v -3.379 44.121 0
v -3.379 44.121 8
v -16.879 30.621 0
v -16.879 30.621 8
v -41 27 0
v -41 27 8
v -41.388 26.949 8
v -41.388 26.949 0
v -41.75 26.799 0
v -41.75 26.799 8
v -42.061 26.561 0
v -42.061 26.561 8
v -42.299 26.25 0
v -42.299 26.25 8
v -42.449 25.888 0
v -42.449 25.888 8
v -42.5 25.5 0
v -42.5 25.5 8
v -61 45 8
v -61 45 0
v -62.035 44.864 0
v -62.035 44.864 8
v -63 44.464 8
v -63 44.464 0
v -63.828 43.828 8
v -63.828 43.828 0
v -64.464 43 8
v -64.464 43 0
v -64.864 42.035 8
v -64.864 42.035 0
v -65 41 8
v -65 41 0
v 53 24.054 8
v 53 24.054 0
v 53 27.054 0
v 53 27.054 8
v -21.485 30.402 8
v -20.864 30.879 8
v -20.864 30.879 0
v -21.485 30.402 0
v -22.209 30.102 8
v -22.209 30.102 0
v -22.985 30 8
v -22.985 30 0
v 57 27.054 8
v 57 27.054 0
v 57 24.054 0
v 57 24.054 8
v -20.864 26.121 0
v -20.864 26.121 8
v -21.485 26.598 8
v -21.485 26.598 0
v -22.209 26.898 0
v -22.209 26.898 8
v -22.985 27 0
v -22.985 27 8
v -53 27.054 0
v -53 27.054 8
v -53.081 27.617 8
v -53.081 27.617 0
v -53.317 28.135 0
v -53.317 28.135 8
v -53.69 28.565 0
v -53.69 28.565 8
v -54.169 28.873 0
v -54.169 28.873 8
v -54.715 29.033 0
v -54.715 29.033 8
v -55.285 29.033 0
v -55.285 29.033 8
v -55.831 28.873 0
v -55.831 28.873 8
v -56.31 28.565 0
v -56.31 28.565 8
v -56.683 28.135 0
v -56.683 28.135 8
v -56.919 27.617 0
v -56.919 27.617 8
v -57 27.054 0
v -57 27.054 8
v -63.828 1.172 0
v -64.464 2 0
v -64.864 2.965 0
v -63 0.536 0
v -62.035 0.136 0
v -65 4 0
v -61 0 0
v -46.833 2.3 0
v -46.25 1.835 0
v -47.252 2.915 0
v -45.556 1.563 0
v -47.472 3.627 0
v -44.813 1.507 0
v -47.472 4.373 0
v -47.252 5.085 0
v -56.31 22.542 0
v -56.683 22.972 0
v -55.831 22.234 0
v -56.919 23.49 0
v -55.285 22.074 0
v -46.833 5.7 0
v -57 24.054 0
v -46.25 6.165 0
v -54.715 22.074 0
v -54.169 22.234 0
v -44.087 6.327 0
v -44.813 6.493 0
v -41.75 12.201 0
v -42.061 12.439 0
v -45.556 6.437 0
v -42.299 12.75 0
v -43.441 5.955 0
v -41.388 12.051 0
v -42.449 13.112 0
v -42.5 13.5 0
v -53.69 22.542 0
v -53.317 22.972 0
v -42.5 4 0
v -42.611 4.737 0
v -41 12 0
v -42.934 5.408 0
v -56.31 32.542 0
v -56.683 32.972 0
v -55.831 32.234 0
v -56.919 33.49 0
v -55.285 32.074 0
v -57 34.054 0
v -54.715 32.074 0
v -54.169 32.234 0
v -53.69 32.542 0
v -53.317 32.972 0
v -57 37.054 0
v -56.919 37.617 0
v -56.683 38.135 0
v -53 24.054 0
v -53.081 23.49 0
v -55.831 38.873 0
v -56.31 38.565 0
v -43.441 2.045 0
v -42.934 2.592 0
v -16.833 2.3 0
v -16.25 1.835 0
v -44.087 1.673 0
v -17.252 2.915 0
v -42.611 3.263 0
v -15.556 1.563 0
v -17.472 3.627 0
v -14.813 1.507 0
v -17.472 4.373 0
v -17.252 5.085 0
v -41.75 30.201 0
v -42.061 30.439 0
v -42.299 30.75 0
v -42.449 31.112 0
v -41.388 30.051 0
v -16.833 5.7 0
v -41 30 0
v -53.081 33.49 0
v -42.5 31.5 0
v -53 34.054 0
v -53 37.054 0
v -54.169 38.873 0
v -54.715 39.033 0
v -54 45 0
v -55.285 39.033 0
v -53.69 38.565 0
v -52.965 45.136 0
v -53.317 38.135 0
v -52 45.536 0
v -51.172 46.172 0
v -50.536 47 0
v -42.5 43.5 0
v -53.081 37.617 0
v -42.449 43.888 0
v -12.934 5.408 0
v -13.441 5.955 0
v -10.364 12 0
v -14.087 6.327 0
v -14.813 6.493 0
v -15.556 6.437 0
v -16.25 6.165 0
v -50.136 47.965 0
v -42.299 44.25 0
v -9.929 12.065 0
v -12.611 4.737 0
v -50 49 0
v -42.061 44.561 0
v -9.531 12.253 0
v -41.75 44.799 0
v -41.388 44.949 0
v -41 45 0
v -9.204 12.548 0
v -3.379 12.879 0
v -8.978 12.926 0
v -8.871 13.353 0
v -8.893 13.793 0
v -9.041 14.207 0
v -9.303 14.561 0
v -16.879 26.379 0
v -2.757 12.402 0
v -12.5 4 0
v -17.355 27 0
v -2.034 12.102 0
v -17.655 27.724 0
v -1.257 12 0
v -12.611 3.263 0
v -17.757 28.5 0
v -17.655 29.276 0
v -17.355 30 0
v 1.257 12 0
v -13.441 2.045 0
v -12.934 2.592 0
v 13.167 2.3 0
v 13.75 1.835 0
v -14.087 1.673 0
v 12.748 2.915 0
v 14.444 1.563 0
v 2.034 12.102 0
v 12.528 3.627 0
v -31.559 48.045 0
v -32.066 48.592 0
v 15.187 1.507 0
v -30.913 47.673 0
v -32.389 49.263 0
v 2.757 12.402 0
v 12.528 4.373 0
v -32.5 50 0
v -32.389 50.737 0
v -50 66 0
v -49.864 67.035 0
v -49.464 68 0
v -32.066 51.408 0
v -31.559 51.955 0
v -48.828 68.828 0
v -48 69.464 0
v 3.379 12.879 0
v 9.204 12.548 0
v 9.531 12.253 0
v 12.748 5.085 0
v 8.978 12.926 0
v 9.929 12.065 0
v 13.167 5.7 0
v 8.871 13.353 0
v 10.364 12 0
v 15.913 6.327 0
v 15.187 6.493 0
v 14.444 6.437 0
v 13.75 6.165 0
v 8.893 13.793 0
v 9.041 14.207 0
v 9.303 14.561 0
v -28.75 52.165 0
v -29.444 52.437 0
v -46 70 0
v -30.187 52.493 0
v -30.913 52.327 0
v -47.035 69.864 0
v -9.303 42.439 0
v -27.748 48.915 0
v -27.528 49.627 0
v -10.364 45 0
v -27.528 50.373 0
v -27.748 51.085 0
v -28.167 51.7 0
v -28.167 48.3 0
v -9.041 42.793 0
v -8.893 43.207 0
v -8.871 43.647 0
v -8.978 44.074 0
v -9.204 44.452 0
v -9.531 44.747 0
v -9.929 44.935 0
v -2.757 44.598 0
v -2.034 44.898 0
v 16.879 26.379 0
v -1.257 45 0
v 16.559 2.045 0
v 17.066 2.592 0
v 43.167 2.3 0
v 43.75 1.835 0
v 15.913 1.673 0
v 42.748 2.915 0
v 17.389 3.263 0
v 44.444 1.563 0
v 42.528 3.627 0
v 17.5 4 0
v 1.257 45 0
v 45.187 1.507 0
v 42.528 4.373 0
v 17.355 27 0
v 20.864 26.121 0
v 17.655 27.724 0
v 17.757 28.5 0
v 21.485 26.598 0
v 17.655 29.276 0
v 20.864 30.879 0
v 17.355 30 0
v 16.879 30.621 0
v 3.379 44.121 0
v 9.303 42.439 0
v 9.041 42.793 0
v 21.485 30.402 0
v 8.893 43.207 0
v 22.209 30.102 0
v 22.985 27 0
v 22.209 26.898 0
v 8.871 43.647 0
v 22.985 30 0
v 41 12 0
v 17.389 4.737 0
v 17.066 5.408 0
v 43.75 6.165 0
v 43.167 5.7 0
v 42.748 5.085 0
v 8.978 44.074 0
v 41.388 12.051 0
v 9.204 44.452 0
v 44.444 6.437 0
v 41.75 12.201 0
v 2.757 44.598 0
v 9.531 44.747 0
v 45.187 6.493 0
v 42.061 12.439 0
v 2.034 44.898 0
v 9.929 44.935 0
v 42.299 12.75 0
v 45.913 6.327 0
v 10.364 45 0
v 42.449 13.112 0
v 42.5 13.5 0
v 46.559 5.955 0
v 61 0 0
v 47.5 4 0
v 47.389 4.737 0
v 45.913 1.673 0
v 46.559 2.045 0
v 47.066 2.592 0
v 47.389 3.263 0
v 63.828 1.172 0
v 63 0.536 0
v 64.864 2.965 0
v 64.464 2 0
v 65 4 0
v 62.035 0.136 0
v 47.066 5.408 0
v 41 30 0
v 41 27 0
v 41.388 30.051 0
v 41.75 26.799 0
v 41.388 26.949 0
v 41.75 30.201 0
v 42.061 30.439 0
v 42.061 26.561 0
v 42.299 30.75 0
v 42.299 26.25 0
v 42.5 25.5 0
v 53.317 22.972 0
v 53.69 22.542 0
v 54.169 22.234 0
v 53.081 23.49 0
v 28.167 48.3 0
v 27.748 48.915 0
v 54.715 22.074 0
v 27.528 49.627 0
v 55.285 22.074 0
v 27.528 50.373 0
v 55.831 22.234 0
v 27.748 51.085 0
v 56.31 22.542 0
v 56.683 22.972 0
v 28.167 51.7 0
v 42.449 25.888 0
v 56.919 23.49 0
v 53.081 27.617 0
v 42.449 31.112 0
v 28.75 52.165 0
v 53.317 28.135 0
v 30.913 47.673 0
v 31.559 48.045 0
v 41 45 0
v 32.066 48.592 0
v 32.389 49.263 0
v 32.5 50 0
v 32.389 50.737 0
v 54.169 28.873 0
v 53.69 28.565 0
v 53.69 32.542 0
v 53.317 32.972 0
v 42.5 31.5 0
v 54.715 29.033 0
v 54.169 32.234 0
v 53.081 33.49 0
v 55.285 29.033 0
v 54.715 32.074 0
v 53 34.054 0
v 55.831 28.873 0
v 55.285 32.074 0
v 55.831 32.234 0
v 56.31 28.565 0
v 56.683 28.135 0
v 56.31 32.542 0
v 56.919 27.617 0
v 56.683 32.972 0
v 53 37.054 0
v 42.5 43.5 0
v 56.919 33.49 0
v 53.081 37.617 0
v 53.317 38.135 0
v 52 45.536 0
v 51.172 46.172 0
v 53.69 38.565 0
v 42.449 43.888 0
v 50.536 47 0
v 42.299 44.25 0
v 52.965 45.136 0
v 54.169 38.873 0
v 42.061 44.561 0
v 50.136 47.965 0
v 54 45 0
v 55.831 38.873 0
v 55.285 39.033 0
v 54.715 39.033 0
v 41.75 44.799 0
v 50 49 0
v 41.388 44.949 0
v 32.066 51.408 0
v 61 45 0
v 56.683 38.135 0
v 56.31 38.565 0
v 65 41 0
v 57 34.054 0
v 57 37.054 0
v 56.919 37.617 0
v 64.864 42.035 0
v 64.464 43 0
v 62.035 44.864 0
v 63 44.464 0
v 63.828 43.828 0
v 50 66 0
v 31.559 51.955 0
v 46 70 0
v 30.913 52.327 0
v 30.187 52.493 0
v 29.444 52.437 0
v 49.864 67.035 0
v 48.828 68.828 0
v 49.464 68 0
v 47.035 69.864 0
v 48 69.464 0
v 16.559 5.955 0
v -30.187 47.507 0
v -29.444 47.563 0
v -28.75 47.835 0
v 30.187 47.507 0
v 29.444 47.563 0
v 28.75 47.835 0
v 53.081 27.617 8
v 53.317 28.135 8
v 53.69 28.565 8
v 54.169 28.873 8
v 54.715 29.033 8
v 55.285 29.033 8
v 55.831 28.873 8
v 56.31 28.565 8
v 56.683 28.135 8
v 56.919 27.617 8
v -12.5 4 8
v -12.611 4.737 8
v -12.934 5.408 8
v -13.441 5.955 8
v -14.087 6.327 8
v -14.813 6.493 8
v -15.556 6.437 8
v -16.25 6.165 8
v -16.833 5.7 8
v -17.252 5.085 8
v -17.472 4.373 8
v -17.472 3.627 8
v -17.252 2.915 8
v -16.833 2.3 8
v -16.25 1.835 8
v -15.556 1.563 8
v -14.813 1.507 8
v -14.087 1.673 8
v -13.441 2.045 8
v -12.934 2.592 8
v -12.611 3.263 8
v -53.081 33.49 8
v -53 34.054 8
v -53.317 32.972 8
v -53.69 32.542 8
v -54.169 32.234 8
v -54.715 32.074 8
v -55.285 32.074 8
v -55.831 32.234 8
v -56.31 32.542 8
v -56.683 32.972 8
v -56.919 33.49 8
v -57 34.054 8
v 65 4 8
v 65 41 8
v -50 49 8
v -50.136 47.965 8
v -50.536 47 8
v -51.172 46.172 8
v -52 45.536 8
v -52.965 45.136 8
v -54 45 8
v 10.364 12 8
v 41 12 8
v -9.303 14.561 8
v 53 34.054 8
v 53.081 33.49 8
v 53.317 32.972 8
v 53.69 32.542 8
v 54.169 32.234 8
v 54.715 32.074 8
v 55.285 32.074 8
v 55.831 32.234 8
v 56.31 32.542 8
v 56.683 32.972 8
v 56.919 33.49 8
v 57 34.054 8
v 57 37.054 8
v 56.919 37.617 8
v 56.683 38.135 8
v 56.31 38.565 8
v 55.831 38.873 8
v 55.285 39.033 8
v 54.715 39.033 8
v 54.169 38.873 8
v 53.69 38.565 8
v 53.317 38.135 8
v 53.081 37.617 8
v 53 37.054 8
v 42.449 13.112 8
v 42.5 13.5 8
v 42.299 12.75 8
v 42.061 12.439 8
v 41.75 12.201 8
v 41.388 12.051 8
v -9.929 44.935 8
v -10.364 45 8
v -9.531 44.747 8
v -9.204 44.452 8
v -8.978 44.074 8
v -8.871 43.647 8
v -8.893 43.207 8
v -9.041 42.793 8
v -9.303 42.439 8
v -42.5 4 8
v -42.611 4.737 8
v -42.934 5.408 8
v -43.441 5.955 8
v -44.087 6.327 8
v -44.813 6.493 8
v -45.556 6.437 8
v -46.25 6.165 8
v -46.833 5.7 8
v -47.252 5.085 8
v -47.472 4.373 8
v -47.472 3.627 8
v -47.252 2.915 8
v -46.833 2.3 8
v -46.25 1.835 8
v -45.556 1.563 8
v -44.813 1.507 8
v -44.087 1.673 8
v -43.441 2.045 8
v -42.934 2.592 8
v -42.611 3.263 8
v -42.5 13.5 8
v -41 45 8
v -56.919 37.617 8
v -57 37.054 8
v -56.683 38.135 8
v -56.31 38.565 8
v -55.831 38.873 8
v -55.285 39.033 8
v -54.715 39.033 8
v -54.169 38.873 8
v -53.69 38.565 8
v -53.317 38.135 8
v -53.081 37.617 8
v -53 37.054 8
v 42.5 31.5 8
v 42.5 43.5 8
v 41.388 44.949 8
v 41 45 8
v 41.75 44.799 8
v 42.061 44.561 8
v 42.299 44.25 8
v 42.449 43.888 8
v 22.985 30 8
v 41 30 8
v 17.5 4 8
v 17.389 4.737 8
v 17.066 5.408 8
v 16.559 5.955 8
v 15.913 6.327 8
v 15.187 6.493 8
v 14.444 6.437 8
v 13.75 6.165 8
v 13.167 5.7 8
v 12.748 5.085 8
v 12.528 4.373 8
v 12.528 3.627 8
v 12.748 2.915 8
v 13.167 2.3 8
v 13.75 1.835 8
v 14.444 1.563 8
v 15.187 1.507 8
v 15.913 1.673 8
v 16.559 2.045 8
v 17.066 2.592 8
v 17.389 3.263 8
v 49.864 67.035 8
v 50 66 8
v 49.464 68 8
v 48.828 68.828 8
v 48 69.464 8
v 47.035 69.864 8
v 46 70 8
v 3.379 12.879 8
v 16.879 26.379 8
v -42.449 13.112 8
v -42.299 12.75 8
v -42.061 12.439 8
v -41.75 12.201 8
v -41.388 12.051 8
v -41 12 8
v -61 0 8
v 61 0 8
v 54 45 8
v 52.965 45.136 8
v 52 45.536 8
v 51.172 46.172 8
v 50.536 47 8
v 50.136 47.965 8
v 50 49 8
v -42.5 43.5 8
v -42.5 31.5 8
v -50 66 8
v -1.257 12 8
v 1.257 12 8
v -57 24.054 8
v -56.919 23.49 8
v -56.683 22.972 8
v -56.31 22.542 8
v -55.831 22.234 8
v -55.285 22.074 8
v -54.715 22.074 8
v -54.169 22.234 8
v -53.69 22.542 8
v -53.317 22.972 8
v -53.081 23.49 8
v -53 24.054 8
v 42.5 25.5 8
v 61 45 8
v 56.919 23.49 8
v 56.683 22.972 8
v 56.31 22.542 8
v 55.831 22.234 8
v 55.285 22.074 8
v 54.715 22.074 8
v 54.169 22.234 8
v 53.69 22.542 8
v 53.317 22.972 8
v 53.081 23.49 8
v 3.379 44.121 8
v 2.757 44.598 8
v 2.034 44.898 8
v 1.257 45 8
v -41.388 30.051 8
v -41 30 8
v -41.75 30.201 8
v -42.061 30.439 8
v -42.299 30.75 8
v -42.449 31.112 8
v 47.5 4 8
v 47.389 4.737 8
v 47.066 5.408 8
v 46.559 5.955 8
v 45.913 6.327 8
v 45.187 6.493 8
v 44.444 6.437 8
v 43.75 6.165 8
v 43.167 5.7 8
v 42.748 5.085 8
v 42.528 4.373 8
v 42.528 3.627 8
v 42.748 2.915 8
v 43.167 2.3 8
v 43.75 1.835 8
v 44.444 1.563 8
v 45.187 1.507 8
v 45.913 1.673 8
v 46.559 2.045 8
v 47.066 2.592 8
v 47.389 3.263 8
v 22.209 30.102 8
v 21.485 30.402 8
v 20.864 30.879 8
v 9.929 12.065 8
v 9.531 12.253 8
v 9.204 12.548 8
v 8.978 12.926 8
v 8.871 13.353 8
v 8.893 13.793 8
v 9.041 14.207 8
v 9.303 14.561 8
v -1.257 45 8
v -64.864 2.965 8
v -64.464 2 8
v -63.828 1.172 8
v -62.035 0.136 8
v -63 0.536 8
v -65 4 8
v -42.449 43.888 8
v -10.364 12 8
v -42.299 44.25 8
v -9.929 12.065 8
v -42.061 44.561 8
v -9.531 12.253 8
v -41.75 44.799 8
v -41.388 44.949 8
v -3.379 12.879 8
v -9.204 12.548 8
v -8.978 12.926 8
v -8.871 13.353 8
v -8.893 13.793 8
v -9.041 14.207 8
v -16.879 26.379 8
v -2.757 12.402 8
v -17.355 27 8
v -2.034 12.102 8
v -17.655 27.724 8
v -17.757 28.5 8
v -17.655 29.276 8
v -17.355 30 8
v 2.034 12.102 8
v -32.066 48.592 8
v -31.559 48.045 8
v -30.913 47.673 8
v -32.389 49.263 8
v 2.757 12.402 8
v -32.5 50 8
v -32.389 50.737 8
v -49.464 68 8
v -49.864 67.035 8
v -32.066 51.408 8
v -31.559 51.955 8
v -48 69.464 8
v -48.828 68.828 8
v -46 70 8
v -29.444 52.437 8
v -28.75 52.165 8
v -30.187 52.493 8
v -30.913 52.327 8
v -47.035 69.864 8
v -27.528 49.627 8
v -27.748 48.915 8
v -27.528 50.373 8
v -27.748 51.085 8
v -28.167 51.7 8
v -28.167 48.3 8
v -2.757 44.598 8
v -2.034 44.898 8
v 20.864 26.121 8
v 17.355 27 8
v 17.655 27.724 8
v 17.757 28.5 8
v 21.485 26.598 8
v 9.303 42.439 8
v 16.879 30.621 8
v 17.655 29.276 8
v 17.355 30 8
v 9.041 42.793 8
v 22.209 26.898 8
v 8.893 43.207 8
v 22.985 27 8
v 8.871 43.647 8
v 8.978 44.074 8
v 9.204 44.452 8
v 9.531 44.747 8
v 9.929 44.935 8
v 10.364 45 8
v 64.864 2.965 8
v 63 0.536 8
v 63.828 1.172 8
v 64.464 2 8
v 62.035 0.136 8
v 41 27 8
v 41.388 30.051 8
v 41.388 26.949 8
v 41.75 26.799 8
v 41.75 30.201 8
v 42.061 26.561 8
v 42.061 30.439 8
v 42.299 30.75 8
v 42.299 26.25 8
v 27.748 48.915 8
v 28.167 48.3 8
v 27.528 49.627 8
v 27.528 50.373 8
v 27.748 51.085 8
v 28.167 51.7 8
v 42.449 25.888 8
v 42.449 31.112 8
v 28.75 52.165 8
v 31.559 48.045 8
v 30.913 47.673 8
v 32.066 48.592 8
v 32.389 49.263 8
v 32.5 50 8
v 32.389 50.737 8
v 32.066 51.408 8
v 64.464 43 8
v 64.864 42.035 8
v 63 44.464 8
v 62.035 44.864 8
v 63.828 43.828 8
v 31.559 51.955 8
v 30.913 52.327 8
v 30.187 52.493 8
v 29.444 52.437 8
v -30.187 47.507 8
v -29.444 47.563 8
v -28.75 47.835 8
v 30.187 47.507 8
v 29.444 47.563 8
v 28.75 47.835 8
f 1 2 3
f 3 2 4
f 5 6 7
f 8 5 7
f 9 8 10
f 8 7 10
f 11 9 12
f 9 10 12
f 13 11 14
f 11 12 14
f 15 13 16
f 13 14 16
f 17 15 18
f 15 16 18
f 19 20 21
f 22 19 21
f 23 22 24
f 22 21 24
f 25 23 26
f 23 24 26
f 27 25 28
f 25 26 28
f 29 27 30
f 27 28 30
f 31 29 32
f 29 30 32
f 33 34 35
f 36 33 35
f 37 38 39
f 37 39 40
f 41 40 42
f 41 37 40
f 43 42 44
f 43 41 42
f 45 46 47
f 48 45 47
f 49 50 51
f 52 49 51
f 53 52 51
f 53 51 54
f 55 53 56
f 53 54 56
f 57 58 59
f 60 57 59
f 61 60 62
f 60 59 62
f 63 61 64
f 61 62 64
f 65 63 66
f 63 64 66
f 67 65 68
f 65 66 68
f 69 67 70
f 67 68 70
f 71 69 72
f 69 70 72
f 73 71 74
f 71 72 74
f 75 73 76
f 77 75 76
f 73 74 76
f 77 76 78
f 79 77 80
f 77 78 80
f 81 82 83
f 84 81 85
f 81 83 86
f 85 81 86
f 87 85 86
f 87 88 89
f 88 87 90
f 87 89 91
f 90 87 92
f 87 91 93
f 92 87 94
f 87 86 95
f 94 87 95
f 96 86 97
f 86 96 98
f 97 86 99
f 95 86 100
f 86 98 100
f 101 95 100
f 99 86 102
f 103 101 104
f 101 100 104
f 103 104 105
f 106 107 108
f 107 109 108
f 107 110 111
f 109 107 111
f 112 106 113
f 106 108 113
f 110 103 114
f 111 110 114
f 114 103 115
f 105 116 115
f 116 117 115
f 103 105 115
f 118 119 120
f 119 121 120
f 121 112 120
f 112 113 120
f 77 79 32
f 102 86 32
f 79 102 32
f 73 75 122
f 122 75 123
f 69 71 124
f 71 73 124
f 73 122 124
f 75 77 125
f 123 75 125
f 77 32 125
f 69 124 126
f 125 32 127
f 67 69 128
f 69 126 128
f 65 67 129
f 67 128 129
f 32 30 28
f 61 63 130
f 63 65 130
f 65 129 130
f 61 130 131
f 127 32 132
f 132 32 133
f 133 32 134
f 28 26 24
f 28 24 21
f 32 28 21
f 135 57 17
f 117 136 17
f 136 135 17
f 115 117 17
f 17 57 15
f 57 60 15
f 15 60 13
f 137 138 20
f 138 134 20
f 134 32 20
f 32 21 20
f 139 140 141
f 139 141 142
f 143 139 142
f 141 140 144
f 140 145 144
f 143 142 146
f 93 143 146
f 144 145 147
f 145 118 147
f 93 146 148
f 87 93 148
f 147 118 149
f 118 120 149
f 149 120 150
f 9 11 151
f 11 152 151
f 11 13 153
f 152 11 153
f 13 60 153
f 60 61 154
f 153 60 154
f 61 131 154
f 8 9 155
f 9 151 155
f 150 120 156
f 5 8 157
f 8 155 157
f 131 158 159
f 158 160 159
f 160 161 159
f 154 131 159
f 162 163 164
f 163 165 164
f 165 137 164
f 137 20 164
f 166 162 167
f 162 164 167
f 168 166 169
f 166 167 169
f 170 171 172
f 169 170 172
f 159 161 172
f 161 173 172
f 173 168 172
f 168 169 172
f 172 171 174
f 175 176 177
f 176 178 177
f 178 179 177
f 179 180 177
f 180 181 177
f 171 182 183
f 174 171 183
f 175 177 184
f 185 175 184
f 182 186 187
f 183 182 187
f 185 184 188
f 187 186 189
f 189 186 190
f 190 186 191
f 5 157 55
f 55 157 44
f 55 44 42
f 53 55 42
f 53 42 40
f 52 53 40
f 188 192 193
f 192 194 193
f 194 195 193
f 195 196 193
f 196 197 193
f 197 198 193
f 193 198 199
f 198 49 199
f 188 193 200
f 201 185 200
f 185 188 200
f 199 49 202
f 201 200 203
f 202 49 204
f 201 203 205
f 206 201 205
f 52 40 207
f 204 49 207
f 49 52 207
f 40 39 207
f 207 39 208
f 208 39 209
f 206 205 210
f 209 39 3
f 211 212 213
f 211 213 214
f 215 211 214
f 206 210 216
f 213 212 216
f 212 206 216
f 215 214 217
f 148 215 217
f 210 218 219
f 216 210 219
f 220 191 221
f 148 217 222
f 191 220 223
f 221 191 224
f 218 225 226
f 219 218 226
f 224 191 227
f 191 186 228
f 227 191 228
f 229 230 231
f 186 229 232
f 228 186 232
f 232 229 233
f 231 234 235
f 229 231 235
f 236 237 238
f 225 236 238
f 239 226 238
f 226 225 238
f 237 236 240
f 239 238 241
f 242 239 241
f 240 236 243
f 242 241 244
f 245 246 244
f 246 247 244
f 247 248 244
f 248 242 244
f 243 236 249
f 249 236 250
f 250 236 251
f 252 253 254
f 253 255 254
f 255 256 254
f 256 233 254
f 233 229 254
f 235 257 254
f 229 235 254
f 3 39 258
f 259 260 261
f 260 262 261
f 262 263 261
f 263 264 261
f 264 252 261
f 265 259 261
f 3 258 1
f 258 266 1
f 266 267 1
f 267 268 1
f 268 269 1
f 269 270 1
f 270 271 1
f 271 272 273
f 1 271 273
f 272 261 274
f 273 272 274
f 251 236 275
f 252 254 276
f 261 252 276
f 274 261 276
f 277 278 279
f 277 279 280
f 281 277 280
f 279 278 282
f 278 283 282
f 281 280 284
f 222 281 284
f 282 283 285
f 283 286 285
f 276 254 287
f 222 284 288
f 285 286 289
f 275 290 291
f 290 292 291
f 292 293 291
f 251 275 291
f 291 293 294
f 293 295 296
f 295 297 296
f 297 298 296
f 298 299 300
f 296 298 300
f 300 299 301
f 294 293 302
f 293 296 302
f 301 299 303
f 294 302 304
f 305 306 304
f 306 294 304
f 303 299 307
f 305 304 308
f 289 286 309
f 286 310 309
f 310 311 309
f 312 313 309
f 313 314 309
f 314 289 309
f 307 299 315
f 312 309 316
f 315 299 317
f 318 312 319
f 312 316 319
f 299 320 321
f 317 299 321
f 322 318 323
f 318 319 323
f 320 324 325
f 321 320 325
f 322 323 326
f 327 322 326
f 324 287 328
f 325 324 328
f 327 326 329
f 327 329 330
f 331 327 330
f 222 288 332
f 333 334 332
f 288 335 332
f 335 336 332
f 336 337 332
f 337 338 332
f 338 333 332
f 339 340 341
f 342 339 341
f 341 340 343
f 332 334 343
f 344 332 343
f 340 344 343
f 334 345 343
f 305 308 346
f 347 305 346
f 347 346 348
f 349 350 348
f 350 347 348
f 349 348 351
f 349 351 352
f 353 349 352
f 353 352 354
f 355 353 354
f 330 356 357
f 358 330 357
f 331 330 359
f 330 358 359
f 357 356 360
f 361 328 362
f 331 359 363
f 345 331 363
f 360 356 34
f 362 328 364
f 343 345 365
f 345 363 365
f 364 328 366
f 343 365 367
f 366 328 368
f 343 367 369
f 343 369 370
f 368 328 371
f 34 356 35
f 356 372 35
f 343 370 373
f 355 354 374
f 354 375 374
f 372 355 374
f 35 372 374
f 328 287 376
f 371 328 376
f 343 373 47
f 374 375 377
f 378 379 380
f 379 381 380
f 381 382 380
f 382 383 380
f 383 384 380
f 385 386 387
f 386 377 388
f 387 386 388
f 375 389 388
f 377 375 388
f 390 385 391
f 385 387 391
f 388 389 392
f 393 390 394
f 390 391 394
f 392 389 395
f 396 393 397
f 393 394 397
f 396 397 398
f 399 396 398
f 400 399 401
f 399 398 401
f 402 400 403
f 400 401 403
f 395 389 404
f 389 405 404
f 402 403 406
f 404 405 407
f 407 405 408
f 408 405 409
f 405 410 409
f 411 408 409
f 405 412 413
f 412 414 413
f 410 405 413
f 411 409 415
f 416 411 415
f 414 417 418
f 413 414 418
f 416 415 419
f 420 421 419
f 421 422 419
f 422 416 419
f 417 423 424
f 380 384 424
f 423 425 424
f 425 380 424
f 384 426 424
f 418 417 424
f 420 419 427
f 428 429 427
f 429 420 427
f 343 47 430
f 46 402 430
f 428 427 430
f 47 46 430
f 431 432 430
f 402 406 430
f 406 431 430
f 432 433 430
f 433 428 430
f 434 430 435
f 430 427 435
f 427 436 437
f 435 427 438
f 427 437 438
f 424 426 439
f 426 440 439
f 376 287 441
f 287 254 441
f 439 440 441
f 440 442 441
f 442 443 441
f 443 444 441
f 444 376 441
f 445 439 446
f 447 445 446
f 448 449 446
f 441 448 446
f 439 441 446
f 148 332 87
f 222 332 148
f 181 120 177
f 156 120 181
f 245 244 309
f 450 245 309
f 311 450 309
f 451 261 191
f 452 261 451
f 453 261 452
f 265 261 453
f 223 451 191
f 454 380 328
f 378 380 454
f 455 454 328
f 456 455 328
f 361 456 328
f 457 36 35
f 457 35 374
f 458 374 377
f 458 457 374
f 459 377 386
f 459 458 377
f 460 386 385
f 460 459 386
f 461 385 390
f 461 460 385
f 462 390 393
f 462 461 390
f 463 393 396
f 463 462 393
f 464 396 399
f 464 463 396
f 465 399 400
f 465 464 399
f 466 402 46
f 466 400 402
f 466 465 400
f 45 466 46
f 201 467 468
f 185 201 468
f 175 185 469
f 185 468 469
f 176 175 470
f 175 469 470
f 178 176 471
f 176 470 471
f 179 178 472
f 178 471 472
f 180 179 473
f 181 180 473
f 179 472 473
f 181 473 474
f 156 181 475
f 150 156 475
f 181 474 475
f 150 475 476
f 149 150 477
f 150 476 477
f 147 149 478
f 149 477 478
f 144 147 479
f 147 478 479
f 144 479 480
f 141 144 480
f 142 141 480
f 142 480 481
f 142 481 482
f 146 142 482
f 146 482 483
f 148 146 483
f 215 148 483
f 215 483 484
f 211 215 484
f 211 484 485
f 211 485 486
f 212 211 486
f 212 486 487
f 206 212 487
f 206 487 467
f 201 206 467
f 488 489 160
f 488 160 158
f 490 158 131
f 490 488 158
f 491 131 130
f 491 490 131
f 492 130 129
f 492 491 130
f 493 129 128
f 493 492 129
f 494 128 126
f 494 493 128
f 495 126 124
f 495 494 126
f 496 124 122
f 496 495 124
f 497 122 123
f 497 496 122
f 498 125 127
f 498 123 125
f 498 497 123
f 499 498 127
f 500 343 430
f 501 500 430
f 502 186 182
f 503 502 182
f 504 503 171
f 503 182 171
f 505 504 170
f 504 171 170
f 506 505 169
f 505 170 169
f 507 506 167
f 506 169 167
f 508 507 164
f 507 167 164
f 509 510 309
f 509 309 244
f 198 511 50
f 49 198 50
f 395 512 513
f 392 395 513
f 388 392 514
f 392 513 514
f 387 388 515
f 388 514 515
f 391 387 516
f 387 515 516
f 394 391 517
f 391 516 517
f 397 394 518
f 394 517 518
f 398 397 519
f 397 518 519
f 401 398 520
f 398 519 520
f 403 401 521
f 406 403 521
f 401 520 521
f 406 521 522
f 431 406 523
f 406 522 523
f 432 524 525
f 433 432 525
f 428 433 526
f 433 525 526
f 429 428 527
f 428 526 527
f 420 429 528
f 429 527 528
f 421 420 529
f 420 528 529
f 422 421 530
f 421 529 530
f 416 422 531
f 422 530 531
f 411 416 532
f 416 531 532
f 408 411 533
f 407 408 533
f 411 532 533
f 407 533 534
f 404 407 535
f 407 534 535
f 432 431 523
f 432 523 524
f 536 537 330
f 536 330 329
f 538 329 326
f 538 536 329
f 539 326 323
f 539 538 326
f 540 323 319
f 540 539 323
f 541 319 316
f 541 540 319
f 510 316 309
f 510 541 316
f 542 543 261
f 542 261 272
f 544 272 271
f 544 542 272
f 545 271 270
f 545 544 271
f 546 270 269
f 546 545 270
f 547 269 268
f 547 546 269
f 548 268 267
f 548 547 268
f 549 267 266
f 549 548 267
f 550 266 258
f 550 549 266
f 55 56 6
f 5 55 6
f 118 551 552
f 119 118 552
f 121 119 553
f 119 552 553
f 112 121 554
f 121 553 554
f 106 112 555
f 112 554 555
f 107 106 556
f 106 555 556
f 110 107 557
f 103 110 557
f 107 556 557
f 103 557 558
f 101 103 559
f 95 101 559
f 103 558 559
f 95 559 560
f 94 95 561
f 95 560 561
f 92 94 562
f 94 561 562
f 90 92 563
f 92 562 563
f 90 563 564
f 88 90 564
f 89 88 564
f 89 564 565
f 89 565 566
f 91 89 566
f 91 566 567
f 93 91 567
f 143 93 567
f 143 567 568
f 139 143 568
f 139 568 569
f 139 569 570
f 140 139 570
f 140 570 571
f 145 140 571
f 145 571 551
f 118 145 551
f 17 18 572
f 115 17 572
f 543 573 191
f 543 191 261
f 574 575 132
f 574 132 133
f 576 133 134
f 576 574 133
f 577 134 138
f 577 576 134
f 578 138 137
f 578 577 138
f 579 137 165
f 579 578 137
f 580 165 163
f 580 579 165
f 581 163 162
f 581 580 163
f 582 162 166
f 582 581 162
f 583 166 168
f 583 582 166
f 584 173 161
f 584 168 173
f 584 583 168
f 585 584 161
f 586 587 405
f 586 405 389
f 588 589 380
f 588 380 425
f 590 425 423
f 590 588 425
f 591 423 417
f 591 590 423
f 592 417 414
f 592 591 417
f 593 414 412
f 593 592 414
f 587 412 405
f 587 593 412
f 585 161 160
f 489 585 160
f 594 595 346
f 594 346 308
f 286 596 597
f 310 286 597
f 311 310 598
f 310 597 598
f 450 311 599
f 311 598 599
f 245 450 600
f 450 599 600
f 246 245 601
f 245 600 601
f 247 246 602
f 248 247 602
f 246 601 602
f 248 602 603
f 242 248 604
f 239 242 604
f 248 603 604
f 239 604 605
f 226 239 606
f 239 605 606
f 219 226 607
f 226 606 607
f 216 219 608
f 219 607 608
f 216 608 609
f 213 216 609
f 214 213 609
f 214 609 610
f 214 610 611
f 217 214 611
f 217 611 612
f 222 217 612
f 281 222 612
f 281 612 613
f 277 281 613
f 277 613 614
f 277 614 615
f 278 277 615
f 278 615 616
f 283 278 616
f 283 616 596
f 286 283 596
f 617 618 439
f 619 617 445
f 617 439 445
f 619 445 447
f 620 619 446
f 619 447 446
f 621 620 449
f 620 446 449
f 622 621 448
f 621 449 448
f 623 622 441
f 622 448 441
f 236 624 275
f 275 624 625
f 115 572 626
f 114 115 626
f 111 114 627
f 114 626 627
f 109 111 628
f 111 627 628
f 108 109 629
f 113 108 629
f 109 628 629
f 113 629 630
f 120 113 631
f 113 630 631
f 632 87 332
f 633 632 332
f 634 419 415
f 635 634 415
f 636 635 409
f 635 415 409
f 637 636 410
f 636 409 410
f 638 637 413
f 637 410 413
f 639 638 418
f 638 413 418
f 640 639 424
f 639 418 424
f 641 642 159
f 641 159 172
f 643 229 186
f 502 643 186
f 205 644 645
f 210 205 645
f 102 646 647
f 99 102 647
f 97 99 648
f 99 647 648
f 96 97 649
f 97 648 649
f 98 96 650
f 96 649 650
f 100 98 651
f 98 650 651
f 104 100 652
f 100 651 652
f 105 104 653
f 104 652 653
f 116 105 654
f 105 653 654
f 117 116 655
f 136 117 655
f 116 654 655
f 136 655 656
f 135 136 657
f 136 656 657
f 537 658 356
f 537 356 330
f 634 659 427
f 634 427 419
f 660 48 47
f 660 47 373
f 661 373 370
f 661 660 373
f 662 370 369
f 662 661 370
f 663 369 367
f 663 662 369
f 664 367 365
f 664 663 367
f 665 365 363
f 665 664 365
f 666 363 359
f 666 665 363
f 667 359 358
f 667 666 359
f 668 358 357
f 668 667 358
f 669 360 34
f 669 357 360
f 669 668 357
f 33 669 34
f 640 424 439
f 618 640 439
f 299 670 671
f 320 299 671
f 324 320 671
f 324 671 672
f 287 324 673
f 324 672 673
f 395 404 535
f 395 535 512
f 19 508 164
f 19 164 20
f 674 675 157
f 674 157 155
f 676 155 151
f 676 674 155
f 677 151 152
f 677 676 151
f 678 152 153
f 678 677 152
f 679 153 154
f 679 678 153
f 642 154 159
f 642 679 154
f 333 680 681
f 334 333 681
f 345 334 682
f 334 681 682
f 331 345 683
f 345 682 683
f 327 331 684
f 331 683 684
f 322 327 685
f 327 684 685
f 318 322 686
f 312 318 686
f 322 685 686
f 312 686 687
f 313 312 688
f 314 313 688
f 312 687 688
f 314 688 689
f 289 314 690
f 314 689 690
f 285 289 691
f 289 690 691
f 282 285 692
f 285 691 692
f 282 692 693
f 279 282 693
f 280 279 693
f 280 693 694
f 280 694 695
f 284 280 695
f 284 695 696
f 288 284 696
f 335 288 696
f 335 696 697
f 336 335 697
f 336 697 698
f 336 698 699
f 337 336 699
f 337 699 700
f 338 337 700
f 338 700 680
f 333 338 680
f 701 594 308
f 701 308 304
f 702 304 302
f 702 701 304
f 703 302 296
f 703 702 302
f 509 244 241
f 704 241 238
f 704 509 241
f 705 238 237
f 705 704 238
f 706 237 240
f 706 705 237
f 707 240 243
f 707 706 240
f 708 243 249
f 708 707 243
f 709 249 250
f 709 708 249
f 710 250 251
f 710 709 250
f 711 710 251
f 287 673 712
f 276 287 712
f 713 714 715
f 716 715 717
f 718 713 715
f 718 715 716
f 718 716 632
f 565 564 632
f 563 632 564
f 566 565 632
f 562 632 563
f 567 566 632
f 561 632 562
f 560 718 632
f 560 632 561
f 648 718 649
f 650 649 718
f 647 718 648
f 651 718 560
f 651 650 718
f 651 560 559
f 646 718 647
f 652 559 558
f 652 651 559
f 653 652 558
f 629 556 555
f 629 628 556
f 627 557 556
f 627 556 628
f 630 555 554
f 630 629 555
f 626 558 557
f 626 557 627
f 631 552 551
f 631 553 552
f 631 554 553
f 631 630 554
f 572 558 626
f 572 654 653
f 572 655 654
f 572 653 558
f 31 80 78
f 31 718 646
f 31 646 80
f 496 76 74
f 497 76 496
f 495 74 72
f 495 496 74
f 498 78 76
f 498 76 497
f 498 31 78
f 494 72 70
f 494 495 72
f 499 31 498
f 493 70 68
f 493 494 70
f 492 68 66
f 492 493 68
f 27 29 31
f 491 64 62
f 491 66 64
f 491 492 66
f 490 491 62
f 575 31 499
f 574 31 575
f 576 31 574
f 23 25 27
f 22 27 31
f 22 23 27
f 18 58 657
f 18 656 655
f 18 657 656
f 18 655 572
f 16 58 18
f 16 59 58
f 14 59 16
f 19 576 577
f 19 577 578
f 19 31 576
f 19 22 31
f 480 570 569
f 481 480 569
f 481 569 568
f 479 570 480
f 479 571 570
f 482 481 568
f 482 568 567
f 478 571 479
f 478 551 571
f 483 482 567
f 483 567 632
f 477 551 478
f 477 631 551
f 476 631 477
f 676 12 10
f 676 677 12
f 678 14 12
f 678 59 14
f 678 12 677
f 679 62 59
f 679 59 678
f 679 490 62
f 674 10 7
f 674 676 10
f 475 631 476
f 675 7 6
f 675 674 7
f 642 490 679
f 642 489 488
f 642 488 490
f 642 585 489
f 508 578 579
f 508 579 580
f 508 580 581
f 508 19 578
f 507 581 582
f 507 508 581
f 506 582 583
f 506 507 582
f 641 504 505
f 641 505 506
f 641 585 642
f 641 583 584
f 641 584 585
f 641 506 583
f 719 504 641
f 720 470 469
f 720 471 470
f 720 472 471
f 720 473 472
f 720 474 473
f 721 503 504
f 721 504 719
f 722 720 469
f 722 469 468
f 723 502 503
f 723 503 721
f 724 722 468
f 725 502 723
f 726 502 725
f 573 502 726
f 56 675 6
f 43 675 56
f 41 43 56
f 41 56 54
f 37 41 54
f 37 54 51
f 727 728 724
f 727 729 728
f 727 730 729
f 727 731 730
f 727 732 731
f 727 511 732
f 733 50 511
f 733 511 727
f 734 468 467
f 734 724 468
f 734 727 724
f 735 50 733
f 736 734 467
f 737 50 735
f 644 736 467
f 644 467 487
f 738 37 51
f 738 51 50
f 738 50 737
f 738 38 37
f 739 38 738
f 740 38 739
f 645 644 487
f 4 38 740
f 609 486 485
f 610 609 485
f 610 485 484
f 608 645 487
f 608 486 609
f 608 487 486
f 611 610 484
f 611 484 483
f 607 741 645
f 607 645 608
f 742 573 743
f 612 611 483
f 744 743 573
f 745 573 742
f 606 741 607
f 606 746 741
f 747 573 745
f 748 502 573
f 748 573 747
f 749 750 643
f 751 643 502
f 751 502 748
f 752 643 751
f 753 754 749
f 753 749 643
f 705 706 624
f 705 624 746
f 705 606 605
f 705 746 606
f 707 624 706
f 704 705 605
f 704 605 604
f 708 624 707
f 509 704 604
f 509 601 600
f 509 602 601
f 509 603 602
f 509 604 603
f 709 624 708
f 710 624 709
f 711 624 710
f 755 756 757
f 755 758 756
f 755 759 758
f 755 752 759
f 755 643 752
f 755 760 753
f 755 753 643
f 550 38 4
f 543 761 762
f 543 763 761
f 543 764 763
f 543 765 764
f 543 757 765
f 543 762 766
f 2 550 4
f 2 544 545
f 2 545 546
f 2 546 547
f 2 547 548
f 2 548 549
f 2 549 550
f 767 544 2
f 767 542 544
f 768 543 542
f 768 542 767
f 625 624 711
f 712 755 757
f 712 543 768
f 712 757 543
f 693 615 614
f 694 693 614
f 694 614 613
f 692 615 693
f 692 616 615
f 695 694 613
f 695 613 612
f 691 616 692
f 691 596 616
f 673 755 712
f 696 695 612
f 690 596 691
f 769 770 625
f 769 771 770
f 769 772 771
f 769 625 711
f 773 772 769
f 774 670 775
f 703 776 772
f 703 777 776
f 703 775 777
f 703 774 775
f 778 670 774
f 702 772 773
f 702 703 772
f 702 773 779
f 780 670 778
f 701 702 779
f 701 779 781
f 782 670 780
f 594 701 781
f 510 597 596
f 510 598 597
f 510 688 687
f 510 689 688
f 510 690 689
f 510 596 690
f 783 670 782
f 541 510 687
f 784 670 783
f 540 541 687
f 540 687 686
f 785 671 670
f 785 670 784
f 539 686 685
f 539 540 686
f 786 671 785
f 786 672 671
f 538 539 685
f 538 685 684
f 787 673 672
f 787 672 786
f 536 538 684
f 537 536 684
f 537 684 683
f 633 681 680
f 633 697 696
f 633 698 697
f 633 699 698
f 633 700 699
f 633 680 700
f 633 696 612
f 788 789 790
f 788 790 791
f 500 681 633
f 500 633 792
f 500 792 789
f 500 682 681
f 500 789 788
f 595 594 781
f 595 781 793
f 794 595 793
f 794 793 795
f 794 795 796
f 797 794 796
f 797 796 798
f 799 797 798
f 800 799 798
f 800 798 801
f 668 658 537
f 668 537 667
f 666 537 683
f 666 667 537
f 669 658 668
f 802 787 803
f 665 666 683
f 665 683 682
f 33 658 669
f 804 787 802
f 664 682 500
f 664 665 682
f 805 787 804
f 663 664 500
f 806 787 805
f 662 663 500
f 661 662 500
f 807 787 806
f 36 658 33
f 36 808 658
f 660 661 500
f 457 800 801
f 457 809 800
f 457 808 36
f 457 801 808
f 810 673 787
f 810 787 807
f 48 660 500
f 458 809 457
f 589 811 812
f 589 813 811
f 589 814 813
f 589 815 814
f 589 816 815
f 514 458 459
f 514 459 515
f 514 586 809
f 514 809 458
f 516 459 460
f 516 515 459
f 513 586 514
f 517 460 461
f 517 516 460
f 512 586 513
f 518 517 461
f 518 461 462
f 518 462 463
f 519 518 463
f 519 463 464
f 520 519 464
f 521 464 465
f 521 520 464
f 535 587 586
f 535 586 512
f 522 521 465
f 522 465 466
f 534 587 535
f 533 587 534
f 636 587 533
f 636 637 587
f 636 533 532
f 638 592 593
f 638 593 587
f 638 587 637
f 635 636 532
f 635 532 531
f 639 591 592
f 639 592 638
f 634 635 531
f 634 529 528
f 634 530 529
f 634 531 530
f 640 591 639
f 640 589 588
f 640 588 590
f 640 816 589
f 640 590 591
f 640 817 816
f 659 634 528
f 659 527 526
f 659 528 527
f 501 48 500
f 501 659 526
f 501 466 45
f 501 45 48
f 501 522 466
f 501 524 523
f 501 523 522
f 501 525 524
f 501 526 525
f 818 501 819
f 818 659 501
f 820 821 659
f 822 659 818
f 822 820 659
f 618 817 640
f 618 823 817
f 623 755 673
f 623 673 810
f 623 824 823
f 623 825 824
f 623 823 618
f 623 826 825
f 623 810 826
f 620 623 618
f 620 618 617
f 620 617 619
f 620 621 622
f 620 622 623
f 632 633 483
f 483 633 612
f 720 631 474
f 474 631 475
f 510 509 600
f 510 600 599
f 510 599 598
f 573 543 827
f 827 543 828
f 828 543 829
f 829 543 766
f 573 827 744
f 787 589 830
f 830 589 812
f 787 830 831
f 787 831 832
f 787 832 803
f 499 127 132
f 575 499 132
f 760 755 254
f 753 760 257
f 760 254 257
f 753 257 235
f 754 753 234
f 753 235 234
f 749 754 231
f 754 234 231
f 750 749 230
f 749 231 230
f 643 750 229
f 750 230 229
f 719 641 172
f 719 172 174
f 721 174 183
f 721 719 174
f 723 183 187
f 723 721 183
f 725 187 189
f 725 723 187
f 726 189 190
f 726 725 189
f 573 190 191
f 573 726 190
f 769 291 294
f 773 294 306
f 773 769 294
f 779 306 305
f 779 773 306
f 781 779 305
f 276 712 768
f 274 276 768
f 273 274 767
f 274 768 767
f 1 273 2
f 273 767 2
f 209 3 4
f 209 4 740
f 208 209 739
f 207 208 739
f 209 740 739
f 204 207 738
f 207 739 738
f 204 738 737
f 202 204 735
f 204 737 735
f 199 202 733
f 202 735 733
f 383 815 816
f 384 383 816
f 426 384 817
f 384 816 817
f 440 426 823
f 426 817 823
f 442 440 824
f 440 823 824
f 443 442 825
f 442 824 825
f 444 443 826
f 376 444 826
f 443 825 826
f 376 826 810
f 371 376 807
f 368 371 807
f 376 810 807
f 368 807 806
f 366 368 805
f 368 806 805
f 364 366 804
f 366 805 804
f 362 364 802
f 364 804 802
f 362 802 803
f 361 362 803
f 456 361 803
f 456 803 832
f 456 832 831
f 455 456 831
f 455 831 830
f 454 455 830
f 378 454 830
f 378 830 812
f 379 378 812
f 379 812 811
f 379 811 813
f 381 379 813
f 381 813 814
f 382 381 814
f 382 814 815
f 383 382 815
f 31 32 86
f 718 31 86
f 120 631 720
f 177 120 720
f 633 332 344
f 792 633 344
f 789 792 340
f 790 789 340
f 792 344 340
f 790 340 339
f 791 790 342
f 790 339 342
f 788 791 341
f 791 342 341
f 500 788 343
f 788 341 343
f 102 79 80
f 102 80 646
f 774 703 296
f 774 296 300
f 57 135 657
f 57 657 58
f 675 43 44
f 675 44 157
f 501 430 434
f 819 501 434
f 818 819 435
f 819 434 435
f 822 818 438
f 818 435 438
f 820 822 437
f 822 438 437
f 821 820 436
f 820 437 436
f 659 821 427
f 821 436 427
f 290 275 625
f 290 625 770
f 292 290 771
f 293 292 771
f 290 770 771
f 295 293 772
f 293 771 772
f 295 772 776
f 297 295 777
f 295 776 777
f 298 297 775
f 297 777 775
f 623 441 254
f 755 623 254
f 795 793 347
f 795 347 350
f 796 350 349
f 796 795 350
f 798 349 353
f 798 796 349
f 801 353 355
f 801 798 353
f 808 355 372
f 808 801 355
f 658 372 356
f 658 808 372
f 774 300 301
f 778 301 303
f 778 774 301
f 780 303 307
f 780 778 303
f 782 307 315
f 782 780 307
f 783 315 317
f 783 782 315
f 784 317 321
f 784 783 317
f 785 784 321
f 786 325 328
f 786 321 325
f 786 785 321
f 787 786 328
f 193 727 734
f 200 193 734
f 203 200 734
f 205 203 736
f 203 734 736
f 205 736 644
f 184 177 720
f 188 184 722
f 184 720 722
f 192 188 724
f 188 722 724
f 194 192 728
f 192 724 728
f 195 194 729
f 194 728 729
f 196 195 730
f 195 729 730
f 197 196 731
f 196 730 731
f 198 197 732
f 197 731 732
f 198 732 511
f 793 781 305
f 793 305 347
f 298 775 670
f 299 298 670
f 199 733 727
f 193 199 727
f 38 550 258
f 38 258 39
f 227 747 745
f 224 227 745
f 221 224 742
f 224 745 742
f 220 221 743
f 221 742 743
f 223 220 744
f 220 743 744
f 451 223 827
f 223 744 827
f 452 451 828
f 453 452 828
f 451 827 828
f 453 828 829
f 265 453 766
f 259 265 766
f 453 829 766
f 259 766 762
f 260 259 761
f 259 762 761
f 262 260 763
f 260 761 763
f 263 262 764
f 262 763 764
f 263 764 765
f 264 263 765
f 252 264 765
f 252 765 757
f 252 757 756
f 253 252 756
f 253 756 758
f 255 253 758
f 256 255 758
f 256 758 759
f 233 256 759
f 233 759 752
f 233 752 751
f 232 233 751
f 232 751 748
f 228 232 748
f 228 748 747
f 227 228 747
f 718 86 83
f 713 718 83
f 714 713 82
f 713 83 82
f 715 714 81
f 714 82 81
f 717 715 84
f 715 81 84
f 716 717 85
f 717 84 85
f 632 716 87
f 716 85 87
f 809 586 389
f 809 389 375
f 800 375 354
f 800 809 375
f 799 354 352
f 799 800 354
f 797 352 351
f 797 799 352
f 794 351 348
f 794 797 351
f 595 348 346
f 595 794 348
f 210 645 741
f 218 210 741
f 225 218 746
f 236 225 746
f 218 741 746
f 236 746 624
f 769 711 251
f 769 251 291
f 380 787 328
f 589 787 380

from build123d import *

# Parameters (mm, degrees)
BOSS_EXTRU_1_DEPTH      = 8
ESQUISSE2_R             = 2.5
ENL_V_MAT_EXTRU_1_DEPTH = 96.859271852
ENL_V_MAT_EXTRU_4_DEPTH = 96.859271852
ESQUISSE5_R             = 2.5
ENL_V_MAT_EXTRU_5_DEPTH = 96.859271852
ENL_V_MAT_EXTRU_6_DEPTH = 96.859271852


with BuildPart() as part:
    # Esquisse1 → Boss.-Extru.1 (new body)
    with BuildSketch(Plane.XY):
        with BuildLine():
            Line((65, 4), (65, 41))
            ThreePointArc((65, 41), (63.828427125, 43.828427125), (61, 45))
            Line((61, 45), (54, 45))
            ThreePointArc((54, 45), (51.171572875, 46.171572875), (50, 49))
            Line((50, 49), (50, 66))
            ThreePointArc((50, 66), (48.828427125, 68.828427125), (46, 70))
            Line((46, 70), (-46, 70))
            ThreePointArc((-46, 70), (-48.828427125, 68.828427125), (-50, 66))
            Line((-50, 66), (-50, 49))
            ThreePointArc((-50, 49), (-51.171572875, 46.171572875), (-54, 45))
            Line((-54, 45), (-61, 45))
            ThreePointArc((-61, 45), (-63.828427125, 43.828427125), (-65, 41))
            Line((-65, 41), (-65, 4))
            ThreePointArc((-65, 4), (-63.828427125, 1.171572875), (-61, 0))
            Line((-61, 0), (61, 0))
            ThreePointArc((61, 0), (63.828427125, 1.171572875), (65, 4))
        make_face()
    extrude(amount=BOSS_EXTRU_1_DEPTH)

    # Esquisse2 → Enlèv. mat.-Extru.1 (cut, through all)
    with BuildSketch(Plane.XY.offset(8)):
        with Locations((30, 50)):
            Circle(ESQUISSE2_R)
        with Locations(Location((-30, 50, 0), (0, 0, 180))):
            Circle(ESQUISSE2_R)
    extrude(amount=-ENL_V_MAT_EXTRU_1_DEPTH, mode=Mode.SUBTRACT)

    # Esquisse4 → Enlèv. mat.-Extru.4 (cut, through all)
    with BuildSketch(Plane.XY.offset(8)):
        with BuildLine():
            Line((-41, 45), (-10.363961031, 45))
            ThreePointArc((-10.363961031, 45), (-8.978141732, 44.074025149), (-9.303300859, 42.439339828))
            Line((-9.303300859, 42.439339828), (-20.863961031, 30.878679656))
            ThreePointArc((-20.863961031, 30.878679656), (-21.837231077, 30.228361402), (-22.985281374, 30))
            Line((-22.985281374, 30), (-41, 30))
            ThreePointArc((-41, 30), (-42.060660172, 30.439339828), (-42.5, 31.5))
            Line((-42.5, 31.5), (-42.5, 43.5))
            ThreePointArc((-42.5, 43.5), (-42.060660172, 44.560660172), (-41, 45))
        make_face()
        with BuildLine():
            Line((-41, 12), (-10.363961031, 12))
            ThreePointArc((-10.363961031, 12), (-8.978141732, 12.925974851), (-9.303300859, 14.560660172))
            Line((-9.303300859, 14.560660172), (-20.863961031, 26.121320344))
            ThreePointArc((-20.863961031, 26.121320344), (-21.837231077, 26.771638598), (-22.985281374, 27))
            Line((-22.985281374, 27), (-41, 27))
            ThreePointArc((-41, 27), (-42.060660172, 26.560660172), (-42.5, 25.5))
            Line((-42.5, 25.5), (-42.5, 13.5))
            ThreePointArc((-42.5, 13.5), (-42.060660172, 12.439339828), (-41, 12))
        make_face()
        with BuildLine():
            Line((42.5, 43.5), (42.5, 31.5))
            ThreePointArc((42.5, 31.5), (42.060660172, 30.439339828), (41, 30))
            Line((41, 30), (22.985281374, 30))
            ThreePointArc((22.985281374, 30), (21.837231077, 30.228361402), (20.863961031, 30.878679656))
            Line((20.863961031, 30.878679656), (9.303300859, 42.439339828))
            ThreePointArc((9.303300859, 42.439339828), (8.978141732, 44.074025149), (10.363961031, 45))
            Line((10.363961031, 45), (41, 45))
            ThreePointArc((41, 45), (42.060660172, 44.560660172), (42.5, 43.5))
        make_face()
        with BuildLine():
            Line((22.985281374, 27), (41, 27))
            ThreePointArc((41, 27), (42.060660172, 26.560660172), (42.5, 25.5))
            Line((42.5, 25.5), (42.5, 13.5))
            ThreePointArc((42.5, 13.5), (42.060660172, 12.439339828), (41, 12))
            Line((41, 12), (10.363961031, 12))
            ThreePointArc((10.363961031, 12), (8.978141732, 12.925974851), (9.303300859, 14.560660172))
            Line((9.303300859, 14.560660172), (20.863961031, 26.121320344))
            ThreePointArc((20.863961031, 26.121320344), (21.837231077, 26.771638598), (22.985281374, 27))
        make_face()
        with BuildLine():
            Line((-3.378679656, 44.121320344), (-16.878679656, 30.621320344))
            ThreePointArc((-16.878679656, 30.621320344), (-17.757359313, 28.5), (-16.878679656, 26.378679656))
            Line((-16.878679656, 26.378679656), (-3.378679656, 12.878679656))
            ThreePointArc((-3.378679656, 12.878679656), (-2.40540961, 12.228361402), (-1.257359313, 12))
            Line((-1.257359313, 12), (1.257359313, 12))
            ThreePointArc((1.257359313, 12), (2.40540961, 12.228361402), (3.378679656, 12.878679656))
            Line((3.378679656, 12.878679656), (16.878679656, 26.378679656))
            ThreePointArc((16.878679656, 26.378679656), (17.757359313, 28.5), (16.878679656, 30.621320344))
            Line((16.878679656, 30.621320344), (3.378679656, 44.121320344))
            ThreePointArc((3.378679656, 44.121320344), (2.40540961, 44.771638598), (1.257359313, 45))
            Line((1.257359313, 45), (-1.257359313, 45))
            ThreePointArc((-1.257359313, 45), (-2.40540961, 44.771638598), (-3.378679656, 44.121320344))
        make_face()
    extrude(amount=-ENL_V_MAT_EXTRU_4_DEPTH, mode=Mode.SUBTRACT)

    # Esquisse5 → Enlèv. mat.-Extru.5 (cut, through all)
    with BuildSketch(Plane.XY.offset(8)):
        with Locations((-45, 4)):
            Circle(ESQUISSE5_R)
        with Locations((-15, 4)):
            Circle(ESQUISSE5_R)
        with Locations((15, 4)):
            Circle(ESQUISSE5_R)
        with Locations((45, 4)):
            Circle(ESQUISSE5_R)
    extrude(amount=-ENL_V_MAT_EXTRU_5_DEPTH, mode=Mode.SUBTRACT)

    # Esquisse6 → Enlèv. mat.-Extru.6 (cut, through all)
    with BuildSketch(Plane.XY.offset(8)):
        with BuildLine():
            Line((57, 27.053539967), (57, 24.053539967))
            ThreePointArc((57, 24.053539967), (55, 22.053539967), (53, 24.053539967))
            Line((53, 24.053539967), (53, 27.053539967))
            ThreePointArc((53, 27.053539967), (55, 29.053539967), (57, 27.053539967))
        make_face()
        with BuildLine():
            Line((57, 34.053539967), (57, 37.053539967))
            ThreePointArc((57, 37.053539967), (55, 39.053539967), (53, 37.053539967))
            Line((53, 37.053539967), (53, 34.053539967))
            ThreePointArc((53, 34.053539967), (55, 32.053539967), (57, 34.053539967))
        make_face()
        with BuildLine():
            Line((-57, 34.053539967), (-57, 37.053539967))
            ThreePointArc((-57, 37.053539967), (-55, 39.053539967), (-53, 37.053539967))
            Line((-53, 37.053539967), (-53, 34.053539967))
            ThreePointArc((-53, 34.053539967), (-55, 32.053539967), (-57, 34.053539967))
        make_face()
        with BuildLine():
            Line((-57, 27.053539967), (-57, 24.053539967))
            ThreePointArc((-57, 24.053539967), (-55, 22.053539967), (-53, 24.053539967))
            Line((-53, 24.053539967), (-53, 27.053539967))
            ThreePointArc((-53, 27.053539967), (-55, 29.053539967), (-57, 27.053539967))
        make_face()
    extrude(amount=-ENL_V_MAT_EXTRU_6_DEPTH, mode=Mode.SUBTRACT)


solid = part.part
